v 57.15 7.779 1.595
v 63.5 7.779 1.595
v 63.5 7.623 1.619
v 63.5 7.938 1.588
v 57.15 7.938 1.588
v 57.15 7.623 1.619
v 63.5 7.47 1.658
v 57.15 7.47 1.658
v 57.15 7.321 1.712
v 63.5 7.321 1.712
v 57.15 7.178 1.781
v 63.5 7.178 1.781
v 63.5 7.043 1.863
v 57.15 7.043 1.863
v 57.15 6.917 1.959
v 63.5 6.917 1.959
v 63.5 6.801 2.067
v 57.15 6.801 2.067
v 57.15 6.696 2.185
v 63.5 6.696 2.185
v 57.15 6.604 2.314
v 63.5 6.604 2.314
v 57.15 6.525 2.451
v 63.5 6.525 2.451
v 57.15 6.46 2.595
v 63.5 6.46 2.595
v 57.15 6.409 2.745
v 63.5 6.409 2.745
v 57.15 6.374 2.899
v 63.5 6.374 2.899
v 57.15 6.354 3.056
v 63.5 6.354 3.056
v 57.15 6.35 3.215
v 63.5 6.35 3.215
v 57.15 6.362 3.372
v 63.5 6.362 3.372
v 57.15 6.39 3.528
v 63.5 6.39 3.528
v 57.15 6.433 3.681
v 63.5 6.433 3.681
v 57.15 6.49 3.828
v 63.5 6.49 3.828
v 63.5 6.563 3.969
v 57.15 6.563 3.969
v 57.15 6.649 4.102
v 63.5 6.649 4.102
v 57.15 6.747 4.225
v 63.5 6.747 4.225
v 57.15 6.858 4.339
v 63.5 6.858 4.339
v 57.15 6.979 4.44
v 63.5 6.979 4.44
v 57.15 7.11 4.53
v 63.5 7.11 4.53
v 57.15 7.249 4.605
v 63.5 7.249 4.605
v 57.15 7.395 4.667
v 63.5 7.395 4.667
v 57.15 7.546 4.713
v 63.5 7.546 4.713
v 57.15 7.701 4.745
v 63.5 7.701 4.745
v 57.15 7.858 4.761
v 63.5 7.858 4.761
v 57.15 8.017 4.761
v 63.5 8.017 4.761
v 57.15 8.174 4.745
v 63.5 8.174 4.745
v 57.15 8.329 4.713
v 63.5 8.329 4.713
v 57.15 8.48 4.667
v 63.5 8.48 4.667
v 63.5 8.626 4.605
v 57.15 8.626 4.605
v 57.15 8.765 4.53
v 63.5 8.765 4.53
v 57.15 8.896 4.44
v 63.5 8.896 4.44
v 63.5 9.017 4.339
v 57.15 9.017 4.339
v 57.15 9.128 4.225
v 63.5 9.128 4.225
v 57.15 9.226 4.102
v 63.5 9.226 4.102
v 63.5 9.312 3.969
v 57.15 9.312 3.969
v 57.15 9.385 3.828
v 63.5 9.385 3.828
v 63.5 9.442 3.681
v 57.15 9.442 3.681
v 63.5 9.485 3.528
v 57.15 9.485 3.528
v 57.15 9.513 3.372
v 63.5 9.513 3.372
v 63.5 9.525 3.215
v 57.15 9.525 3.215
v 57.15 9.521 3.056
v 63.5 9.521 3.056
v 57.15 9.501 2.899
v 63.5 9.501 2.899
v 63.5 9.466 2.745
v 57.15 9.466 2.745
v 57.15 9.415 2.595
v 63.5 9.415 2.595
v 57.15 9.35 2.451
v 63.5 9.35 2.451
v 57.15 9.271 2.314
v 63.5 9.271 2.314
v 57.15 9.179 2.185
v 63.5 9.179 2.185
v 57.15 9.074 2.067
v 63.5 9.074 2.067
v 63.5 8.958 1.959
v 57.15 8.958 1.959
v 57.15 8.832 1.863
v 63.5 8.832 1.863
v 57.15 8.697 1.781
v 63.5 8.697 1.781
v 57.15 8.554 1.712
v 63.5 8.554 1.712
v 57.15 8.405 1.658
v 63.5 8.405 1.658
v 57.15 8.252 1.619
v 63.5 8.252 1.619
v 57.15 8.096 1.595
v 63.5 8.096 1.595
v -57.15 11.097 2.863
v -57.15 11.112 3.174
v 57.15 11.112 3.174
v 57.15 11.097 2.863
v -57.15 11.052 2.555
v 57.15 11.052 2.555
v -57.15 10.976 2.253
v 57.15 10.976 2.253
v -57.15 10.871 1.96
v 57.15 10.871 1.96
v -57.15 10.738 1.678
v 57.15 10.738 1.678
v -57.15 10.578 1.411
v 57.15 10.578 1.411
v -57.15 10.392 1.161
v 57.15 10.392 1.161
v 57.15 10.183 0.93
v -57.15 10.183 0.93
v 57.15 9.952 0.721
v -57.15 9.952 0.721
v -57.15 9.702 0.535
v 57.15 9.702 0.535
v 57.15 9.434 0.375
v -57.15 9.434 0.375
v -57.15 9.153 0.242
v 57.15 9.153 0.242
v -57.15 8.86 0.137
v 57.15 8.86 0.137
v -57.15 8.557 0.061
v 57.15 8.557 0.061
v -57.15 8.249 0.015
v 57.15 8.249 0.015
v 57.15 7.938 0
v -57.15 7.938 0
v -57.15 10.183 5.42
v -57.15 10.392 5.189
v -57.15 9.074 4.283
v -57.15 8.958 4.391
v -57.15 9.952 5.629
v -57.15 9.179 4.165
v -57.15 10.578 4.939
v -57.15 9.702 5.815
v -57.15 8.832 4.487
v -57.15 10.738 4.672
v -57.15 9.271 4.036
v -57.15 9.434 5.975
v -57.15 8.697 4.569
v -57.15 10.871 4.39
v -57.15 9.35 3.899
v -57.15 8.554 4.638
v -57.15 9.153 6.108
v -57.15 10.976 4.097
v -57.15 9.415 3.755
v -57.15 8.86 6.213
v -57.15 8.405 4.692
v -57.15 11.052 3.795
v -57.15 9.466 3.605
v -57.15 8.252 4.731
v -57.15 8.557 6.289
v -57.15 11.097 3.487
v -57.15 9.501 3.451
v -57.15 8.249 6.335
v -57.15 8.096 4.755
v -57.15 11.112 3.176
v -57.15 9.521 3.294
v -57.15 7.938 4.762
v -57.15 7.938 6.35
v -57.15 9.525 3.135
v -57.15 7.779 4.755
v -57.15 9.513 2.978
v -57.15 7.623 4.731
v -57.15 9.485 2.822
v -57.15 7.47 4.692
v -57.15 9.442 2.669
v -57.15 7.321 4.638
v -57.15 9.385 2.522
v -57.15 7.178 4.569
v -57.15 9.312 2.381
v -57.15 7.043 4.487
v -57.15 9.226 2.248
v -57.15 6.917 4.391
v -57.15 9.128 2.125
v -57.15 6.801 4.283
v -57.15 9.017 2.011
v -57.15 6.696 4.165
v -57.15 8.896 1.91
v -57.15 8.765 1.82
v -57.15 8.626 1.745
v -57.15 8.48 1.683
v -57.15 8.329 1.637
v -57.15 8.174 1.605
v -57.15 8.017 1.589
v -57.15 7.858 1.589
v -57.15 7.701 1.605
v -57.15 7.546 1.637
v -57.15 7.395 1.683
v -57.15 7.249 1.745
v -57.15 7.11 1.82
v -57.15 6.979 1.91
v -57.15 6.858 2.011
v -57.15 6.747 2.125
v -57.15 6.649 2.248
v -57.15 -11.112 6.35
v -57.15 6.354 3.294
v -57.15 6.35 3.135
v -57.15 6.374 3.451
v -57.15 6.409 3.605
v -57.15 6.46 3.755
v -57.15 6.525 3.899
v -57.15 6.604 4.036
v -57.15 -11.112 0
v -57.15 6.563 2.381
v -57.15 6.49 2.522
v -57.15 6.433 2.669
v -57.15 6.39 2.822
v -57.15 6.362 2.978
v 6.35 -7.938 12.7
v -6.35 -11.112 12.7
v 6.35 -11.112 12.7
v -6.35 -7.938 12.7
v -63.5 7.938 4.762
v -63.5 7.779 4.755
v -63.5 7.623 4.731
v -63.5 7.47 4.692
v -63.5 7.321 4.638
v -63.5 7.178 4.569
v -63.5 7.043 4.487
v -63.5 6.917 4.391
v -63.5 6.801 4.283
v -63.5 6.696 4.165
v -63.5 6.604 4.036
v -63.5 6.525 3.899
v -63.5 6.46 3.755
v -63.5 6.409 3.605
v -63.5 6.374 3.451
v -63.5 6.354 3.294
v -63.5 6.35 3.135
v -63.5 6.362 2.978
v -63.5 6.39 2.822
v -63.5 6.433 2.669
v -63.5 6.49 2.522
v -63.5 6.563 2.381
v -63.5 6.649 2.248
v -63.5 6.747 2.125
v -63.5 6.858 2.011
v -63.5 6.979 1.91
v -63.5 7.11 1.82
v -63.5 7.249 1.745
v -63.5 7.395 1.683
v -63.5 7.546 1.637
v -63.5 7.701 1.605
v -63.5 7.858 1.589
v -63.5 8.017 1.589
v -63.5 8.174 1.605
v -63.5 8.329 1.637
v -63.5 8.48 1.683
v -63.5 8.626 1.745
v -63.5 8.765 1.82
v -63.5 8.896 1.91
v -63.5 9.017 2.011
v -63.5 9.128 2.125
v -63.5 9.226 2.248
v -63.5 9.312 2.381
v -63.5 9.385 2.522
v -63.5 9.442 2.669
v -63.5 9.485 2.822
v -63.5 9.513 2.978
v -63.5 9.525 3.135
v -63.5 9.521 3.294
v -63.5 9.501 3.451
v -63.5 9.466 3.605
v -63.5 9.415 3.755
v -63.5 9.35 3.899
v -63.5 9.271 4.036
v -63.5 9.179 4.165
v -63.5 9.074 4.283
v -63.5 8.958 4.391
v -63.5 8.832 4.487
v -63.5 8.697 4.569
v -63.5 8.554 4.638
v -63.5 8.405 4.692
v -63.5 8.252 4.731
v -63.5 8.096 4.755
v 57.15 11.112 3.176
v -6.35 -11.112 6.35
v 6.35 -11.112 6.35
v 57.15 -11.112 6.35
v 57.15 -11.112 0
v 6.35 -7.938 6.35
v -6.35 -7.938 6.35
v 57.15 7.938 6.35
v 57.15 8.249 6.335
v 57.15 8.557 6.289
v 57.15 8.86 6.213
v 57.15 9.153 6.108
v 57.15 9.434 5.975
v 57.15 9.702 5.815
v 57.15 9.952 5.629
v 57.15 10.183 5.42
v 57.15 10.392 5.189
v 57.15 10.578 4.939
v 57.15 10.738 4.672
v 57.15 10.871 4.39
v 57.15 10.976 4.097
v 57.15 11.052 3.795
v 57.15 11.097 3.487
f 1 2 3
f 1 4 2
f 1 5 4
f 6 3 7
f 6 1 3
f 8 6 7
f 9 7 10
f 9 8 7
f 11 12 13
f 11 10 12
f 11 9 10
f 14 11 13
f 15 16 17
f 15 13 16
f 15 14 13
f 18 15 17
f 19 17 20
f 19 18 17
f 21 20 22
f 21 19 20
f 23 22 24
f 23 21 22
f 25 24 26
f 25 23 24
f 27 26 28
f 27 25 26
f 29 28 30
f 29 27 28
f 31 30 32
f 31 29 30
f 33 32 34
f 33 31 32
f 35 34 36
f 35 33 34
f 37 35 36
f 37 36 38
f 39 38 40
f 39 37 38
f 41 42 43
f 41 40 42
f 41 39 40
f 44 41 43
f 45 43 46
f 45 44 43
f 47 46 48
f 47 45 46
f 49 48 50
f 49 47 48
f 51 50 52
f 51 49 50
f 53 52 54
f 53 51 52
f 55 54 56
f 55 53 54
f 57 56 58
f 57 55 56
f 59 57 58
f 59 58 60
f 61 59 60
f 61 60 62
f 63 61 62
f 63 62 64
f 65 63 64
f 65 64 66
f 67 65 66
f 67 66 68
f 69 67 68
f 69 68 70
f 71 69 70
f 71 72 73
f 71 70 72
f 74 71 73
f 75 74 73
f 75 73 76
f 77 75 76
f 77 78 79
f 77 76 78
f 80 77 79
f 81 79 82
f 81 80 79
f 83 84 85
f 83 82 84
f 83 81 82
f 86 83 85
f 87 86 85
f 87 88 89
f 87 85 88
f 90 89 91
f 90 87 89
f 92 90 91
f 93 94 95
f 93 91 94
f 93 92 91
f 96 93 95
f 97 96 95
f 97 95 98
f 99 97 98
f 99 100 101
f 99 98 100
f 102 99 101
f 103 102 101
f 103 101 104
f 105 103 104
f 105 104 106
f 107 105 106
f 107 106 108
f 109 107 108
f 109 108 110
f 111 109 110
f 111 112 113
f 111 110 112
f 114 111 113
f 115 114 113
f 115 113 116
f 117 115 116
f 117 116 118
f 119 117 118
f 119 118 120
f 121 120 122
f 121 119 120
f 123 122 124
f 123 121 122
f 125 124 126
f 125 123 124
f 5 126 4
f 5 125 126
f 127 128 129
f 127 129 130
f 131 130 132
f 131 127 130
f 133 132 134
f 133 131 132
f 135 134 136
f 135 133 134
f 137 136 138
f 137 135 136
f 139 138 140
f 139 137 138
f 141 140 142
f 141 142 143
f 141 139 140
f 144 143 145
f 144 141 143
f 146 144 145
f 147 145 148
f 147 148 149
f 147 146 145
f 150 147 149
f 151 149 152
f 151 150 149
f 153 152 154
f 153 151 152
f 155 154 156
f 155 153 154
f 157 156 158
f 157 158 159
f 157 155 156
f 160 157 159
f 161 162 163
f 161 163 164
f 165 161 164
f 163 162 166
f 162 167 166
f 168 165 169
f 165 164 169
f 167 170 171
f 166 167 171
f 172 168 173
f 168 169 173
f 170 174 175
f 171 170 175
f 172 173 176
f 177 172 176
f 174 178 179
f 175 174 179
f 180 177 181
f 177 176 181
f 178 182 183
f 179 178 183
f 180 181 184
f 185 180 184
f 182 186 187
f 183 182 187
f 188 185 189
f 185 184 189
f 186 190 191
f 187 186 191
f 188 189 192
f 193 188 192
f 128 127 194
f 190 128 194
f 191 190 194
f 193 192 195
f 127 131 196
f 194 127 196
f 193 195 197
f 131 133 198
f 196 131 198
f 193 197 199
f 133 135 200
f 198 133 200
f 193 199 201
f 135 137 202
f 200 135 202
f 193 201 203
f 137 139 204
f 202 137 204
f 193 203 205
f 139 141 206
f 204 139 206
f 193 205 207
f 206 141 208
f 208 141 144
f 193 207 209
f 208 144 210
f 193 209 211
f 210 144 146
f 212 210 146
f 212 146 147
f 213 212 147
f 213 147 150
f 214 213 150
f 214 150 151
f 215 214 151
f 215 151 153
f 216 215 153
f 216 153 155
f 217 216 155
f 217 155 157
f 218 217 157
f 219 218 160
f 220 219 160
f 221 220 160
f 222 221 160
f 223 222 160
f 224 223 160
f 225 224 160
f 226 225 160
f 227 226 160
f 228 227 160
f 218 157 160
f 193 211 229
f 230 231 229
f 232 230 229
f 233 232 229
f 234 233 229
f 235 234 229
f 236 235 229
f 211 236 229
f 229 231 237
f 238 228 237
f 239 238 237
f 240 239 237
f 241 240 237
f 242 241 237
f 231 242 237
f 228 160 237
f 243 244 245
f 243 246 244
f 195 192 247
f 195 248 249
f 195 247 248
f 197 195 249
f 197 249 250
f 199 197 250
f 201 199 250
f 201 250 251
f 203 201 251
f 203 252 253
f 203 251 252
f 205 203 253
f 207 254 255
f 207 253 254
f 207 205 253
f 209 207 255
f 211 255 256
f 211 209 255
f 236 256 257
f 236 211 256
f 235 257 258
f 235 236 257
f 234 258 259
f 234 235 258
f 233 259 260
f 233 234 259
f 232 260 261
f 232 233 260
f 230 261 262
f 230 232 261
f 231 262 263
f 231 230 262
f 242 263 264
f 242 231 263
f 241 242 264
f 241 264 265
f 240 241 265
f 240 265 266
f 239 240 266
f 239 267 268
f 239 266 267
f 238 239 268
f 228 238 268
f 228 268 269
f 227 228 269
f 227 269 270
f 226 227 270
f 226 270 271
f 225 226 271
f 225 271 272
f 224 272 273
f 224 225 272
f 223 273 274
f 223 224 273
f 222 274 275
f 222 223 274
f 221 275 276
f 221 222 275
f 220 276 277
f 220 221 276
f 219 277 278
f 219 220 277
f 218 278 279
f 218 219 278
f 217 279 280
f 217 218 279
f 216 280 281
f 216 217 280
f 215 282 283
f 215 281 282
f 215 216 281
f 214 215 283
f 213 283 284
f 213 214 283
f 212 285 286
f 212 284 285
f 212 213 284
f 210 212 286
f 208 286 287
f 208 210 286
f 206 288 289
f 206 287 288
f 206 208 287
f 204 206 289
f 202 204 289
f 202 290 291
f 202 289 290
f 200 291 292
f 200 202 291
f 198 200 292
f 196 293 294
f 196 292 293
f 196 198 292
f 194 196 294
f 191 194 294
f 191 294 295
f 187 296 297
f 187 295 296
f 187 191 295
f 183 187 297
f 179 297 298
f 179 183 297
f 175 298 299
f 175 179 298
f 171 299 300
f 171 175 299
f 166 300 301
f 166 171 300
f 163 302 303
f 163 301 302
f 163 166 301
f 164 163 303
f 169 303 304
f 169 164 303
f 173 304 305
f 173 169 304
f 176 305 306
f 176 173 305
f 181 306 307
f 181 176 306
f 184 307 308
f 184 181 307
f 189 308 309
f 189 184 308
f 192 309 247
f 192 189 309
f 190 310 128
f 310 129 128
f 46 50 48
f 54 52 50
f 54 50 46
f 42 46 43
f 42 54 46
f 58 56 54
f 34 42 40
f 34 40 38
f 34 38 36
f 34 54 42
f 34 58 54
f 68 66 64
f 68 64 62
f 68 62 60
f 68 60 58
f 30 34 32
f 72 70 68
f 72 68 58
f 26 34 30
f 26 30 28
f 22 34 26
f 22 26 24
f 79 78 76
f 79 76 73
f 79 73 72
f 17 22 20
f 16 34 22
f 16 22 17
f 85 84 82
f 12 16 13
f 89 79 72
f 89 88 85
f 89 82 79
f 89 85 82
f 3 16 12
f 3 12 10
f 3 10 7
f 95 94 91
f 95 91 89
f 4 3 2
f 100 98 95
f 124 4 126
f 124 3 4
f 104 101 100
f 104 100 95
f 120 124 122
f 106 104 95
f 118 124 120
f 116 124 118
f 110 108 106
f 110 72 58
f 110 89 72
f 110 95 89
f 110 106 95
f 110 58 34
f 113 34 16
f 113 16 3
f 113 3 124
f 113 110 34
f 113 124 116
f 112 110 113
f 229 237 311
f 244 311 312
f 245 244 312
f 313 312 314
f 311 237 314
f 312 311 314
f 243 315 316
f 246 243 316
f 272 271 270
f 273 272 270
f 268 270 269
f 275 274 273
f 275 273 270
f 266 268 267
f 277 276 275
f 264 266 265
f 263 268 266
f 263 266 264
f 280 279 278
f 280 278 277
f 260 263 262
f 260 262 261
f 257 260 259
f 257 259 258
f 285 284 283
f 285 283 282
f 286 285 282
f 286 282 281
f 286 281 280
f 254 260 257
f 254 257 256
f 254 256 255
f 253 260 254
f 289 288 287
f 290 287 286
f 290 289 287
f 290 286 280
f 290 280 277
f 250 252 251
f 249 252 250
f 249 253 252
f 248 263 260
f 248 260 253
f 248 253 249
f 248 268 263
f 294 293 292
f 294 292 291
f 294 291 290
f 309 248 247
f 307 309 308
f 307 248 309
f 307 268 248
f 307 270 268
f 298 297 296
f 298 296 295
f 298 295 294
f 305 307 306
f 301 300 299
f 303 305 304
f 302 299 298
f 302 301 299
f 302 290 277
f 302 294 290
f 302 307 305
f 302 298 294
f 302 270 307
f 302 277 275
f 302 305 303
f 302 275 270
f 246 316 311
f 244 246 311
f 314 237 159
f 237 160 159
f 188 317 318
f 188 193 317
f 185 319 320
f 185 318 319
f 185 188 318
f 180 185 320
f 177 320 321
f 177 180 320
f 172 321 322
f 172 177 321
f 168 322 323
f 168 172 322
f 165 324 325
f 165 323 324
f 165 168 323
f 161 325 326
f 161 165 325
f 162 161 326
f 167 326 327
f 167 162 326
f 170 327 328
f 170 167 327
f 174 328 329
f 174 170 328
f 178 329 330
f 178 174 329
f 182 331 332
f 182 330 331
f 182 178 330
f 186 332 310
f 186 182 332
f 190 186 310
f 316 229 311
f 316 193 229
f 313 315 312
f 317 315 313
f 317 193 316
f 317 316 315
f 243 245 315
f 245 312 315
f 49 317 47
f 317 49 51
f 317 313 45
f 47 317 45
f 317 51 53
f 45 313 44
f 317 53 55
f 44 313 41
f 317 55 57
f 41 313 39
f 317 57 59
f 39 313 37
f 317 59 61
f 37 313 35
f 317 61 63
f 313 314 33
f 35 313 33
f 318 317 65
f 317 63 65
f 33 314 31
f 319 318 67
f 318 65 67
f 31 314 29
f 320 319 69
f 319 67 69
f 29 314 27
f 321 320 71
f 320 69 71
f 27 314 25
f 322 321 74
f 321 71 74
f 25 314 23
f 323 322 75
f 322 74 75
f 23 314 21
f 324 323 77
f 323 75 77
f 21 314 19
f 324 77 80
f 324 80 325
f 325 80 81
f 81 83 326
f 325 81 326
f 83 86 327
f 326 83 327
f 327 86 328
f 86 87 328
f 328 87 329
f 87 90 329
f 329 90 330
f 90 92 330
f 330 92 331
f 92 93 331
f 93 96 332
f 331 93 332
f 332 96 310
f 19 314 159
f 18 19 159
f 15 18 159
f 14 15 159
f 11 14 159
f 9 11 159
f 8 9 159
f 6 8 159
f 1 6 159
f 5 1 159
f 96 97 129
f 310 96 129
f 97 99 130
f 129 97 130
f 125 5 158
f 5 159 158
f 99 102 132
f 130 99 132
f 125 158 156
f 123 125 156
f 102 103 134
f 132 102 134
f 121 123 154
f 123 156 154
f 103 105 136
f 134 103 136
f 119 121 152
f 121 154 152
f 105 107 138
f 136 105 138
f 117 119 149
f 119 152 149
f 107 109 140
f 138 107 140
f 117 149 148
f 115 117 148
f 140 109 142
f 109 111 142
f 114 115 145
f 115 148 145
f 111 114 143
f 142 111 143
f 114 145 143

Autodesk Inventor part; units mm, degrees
ref_plane "YZ Plane" through (0, 0, 0) normal (1, 0, 0) x (0, 1, 0)
ref_plane "XZ Plane" through (0, 0, 0) normal (0, 1, 0) x (-1, 0, 0)
ref_plane "XY Plane" through (0, 0, 0) normal (0, 0, 1) x (1, 0, 0)
sketch "Sketch1" plane through (0, 0, 0) normal (0, 0, 1) x (1, 0, 0)
  line L0 (-57.15, -11.1125) -> (57.15, -11.1125)
  line L1 (57.15, -11.1125) -> (57.15, 11.1125)
  line L2 (57.15, 11.1125) -> (-57.15, 11.1125)
  line L3 (-57.15, 11.1125) -> (-57.15, -11.1125)
  line L4 (-57.15, -11.1125) -> (57.15, 11.1125) construction
  line L5 (57.15, -11.1125) -> (-57.15, 11.1125) construction
  point P0 (0, 0)
  dimension "d0" = 114.3
  dimension "d14" = 22.225
extrude "Extrusion1" add sketch "Sketch1" along normal blind 6.35
sketch "Sketch2" plane through (57.15, -11.1125, 0) normal (1, 0, 0) x (0, 0, -1)
  circle A0 centre (-3.175, 19.05) radius 1.5875
  line L0 (0, 22.225) -> (-6.35, 22.225) projected
  point P0 (0, 11.1125)
  dimension "d3" = 3.175
  dimension "d4" = 3.175
extrude "Extrusion2" add sketch "Sketch2" along normal blind 6.35
sketch "Sketch3" plane through (-57.15, -11.1125, 0) normal (-1, 0, 0) x (0, 0, 1)
  circle A0 centre (3.175, 19.05) radius 1.5875 projected
  circle A1 centre (3.175, 19.05) radius 1.5875
  point P0 (0, 11.1125)
extrude "Extrusion3" add sketch "Sketch3" along normal blind 6.35
sketch "Sketch4" plane through (0, 0, 6.35) normal (0, 0, 1) x (1, 0, 0)
  line L0 (-57.15, -11.1125) -> (57.15, -11.1125) projected
  line L1 (-6.35, -11.1125) -> (6.35, -11.1125)
  line L2 (6.35, -11.1125) -> (6.35, -7.9375)
  line L3 (6.35, -7.9375) -> (-6.35, -7.9375)
  line L4 (-6.35, -7.9375) -> (-6.35, -11.1125)
  line L5 (-57.15, 11.1125) -> (-57.15, -11.1125) projected
  point P0 (0, 0)
  point P1 (6.35, -11.1125)
  dimension "d9" = 12.7
  dimension "d10" = 3.175
  dimension "d11" = 50.8
extrude "Extrusion4" add sketch "Sketch4" along normal blind 6.35
fillet "Fillet1" radius 3.175 2 edges at (0, 11.1125, 6.35) (0, 11.1125, 0)
properties part number "Door"
